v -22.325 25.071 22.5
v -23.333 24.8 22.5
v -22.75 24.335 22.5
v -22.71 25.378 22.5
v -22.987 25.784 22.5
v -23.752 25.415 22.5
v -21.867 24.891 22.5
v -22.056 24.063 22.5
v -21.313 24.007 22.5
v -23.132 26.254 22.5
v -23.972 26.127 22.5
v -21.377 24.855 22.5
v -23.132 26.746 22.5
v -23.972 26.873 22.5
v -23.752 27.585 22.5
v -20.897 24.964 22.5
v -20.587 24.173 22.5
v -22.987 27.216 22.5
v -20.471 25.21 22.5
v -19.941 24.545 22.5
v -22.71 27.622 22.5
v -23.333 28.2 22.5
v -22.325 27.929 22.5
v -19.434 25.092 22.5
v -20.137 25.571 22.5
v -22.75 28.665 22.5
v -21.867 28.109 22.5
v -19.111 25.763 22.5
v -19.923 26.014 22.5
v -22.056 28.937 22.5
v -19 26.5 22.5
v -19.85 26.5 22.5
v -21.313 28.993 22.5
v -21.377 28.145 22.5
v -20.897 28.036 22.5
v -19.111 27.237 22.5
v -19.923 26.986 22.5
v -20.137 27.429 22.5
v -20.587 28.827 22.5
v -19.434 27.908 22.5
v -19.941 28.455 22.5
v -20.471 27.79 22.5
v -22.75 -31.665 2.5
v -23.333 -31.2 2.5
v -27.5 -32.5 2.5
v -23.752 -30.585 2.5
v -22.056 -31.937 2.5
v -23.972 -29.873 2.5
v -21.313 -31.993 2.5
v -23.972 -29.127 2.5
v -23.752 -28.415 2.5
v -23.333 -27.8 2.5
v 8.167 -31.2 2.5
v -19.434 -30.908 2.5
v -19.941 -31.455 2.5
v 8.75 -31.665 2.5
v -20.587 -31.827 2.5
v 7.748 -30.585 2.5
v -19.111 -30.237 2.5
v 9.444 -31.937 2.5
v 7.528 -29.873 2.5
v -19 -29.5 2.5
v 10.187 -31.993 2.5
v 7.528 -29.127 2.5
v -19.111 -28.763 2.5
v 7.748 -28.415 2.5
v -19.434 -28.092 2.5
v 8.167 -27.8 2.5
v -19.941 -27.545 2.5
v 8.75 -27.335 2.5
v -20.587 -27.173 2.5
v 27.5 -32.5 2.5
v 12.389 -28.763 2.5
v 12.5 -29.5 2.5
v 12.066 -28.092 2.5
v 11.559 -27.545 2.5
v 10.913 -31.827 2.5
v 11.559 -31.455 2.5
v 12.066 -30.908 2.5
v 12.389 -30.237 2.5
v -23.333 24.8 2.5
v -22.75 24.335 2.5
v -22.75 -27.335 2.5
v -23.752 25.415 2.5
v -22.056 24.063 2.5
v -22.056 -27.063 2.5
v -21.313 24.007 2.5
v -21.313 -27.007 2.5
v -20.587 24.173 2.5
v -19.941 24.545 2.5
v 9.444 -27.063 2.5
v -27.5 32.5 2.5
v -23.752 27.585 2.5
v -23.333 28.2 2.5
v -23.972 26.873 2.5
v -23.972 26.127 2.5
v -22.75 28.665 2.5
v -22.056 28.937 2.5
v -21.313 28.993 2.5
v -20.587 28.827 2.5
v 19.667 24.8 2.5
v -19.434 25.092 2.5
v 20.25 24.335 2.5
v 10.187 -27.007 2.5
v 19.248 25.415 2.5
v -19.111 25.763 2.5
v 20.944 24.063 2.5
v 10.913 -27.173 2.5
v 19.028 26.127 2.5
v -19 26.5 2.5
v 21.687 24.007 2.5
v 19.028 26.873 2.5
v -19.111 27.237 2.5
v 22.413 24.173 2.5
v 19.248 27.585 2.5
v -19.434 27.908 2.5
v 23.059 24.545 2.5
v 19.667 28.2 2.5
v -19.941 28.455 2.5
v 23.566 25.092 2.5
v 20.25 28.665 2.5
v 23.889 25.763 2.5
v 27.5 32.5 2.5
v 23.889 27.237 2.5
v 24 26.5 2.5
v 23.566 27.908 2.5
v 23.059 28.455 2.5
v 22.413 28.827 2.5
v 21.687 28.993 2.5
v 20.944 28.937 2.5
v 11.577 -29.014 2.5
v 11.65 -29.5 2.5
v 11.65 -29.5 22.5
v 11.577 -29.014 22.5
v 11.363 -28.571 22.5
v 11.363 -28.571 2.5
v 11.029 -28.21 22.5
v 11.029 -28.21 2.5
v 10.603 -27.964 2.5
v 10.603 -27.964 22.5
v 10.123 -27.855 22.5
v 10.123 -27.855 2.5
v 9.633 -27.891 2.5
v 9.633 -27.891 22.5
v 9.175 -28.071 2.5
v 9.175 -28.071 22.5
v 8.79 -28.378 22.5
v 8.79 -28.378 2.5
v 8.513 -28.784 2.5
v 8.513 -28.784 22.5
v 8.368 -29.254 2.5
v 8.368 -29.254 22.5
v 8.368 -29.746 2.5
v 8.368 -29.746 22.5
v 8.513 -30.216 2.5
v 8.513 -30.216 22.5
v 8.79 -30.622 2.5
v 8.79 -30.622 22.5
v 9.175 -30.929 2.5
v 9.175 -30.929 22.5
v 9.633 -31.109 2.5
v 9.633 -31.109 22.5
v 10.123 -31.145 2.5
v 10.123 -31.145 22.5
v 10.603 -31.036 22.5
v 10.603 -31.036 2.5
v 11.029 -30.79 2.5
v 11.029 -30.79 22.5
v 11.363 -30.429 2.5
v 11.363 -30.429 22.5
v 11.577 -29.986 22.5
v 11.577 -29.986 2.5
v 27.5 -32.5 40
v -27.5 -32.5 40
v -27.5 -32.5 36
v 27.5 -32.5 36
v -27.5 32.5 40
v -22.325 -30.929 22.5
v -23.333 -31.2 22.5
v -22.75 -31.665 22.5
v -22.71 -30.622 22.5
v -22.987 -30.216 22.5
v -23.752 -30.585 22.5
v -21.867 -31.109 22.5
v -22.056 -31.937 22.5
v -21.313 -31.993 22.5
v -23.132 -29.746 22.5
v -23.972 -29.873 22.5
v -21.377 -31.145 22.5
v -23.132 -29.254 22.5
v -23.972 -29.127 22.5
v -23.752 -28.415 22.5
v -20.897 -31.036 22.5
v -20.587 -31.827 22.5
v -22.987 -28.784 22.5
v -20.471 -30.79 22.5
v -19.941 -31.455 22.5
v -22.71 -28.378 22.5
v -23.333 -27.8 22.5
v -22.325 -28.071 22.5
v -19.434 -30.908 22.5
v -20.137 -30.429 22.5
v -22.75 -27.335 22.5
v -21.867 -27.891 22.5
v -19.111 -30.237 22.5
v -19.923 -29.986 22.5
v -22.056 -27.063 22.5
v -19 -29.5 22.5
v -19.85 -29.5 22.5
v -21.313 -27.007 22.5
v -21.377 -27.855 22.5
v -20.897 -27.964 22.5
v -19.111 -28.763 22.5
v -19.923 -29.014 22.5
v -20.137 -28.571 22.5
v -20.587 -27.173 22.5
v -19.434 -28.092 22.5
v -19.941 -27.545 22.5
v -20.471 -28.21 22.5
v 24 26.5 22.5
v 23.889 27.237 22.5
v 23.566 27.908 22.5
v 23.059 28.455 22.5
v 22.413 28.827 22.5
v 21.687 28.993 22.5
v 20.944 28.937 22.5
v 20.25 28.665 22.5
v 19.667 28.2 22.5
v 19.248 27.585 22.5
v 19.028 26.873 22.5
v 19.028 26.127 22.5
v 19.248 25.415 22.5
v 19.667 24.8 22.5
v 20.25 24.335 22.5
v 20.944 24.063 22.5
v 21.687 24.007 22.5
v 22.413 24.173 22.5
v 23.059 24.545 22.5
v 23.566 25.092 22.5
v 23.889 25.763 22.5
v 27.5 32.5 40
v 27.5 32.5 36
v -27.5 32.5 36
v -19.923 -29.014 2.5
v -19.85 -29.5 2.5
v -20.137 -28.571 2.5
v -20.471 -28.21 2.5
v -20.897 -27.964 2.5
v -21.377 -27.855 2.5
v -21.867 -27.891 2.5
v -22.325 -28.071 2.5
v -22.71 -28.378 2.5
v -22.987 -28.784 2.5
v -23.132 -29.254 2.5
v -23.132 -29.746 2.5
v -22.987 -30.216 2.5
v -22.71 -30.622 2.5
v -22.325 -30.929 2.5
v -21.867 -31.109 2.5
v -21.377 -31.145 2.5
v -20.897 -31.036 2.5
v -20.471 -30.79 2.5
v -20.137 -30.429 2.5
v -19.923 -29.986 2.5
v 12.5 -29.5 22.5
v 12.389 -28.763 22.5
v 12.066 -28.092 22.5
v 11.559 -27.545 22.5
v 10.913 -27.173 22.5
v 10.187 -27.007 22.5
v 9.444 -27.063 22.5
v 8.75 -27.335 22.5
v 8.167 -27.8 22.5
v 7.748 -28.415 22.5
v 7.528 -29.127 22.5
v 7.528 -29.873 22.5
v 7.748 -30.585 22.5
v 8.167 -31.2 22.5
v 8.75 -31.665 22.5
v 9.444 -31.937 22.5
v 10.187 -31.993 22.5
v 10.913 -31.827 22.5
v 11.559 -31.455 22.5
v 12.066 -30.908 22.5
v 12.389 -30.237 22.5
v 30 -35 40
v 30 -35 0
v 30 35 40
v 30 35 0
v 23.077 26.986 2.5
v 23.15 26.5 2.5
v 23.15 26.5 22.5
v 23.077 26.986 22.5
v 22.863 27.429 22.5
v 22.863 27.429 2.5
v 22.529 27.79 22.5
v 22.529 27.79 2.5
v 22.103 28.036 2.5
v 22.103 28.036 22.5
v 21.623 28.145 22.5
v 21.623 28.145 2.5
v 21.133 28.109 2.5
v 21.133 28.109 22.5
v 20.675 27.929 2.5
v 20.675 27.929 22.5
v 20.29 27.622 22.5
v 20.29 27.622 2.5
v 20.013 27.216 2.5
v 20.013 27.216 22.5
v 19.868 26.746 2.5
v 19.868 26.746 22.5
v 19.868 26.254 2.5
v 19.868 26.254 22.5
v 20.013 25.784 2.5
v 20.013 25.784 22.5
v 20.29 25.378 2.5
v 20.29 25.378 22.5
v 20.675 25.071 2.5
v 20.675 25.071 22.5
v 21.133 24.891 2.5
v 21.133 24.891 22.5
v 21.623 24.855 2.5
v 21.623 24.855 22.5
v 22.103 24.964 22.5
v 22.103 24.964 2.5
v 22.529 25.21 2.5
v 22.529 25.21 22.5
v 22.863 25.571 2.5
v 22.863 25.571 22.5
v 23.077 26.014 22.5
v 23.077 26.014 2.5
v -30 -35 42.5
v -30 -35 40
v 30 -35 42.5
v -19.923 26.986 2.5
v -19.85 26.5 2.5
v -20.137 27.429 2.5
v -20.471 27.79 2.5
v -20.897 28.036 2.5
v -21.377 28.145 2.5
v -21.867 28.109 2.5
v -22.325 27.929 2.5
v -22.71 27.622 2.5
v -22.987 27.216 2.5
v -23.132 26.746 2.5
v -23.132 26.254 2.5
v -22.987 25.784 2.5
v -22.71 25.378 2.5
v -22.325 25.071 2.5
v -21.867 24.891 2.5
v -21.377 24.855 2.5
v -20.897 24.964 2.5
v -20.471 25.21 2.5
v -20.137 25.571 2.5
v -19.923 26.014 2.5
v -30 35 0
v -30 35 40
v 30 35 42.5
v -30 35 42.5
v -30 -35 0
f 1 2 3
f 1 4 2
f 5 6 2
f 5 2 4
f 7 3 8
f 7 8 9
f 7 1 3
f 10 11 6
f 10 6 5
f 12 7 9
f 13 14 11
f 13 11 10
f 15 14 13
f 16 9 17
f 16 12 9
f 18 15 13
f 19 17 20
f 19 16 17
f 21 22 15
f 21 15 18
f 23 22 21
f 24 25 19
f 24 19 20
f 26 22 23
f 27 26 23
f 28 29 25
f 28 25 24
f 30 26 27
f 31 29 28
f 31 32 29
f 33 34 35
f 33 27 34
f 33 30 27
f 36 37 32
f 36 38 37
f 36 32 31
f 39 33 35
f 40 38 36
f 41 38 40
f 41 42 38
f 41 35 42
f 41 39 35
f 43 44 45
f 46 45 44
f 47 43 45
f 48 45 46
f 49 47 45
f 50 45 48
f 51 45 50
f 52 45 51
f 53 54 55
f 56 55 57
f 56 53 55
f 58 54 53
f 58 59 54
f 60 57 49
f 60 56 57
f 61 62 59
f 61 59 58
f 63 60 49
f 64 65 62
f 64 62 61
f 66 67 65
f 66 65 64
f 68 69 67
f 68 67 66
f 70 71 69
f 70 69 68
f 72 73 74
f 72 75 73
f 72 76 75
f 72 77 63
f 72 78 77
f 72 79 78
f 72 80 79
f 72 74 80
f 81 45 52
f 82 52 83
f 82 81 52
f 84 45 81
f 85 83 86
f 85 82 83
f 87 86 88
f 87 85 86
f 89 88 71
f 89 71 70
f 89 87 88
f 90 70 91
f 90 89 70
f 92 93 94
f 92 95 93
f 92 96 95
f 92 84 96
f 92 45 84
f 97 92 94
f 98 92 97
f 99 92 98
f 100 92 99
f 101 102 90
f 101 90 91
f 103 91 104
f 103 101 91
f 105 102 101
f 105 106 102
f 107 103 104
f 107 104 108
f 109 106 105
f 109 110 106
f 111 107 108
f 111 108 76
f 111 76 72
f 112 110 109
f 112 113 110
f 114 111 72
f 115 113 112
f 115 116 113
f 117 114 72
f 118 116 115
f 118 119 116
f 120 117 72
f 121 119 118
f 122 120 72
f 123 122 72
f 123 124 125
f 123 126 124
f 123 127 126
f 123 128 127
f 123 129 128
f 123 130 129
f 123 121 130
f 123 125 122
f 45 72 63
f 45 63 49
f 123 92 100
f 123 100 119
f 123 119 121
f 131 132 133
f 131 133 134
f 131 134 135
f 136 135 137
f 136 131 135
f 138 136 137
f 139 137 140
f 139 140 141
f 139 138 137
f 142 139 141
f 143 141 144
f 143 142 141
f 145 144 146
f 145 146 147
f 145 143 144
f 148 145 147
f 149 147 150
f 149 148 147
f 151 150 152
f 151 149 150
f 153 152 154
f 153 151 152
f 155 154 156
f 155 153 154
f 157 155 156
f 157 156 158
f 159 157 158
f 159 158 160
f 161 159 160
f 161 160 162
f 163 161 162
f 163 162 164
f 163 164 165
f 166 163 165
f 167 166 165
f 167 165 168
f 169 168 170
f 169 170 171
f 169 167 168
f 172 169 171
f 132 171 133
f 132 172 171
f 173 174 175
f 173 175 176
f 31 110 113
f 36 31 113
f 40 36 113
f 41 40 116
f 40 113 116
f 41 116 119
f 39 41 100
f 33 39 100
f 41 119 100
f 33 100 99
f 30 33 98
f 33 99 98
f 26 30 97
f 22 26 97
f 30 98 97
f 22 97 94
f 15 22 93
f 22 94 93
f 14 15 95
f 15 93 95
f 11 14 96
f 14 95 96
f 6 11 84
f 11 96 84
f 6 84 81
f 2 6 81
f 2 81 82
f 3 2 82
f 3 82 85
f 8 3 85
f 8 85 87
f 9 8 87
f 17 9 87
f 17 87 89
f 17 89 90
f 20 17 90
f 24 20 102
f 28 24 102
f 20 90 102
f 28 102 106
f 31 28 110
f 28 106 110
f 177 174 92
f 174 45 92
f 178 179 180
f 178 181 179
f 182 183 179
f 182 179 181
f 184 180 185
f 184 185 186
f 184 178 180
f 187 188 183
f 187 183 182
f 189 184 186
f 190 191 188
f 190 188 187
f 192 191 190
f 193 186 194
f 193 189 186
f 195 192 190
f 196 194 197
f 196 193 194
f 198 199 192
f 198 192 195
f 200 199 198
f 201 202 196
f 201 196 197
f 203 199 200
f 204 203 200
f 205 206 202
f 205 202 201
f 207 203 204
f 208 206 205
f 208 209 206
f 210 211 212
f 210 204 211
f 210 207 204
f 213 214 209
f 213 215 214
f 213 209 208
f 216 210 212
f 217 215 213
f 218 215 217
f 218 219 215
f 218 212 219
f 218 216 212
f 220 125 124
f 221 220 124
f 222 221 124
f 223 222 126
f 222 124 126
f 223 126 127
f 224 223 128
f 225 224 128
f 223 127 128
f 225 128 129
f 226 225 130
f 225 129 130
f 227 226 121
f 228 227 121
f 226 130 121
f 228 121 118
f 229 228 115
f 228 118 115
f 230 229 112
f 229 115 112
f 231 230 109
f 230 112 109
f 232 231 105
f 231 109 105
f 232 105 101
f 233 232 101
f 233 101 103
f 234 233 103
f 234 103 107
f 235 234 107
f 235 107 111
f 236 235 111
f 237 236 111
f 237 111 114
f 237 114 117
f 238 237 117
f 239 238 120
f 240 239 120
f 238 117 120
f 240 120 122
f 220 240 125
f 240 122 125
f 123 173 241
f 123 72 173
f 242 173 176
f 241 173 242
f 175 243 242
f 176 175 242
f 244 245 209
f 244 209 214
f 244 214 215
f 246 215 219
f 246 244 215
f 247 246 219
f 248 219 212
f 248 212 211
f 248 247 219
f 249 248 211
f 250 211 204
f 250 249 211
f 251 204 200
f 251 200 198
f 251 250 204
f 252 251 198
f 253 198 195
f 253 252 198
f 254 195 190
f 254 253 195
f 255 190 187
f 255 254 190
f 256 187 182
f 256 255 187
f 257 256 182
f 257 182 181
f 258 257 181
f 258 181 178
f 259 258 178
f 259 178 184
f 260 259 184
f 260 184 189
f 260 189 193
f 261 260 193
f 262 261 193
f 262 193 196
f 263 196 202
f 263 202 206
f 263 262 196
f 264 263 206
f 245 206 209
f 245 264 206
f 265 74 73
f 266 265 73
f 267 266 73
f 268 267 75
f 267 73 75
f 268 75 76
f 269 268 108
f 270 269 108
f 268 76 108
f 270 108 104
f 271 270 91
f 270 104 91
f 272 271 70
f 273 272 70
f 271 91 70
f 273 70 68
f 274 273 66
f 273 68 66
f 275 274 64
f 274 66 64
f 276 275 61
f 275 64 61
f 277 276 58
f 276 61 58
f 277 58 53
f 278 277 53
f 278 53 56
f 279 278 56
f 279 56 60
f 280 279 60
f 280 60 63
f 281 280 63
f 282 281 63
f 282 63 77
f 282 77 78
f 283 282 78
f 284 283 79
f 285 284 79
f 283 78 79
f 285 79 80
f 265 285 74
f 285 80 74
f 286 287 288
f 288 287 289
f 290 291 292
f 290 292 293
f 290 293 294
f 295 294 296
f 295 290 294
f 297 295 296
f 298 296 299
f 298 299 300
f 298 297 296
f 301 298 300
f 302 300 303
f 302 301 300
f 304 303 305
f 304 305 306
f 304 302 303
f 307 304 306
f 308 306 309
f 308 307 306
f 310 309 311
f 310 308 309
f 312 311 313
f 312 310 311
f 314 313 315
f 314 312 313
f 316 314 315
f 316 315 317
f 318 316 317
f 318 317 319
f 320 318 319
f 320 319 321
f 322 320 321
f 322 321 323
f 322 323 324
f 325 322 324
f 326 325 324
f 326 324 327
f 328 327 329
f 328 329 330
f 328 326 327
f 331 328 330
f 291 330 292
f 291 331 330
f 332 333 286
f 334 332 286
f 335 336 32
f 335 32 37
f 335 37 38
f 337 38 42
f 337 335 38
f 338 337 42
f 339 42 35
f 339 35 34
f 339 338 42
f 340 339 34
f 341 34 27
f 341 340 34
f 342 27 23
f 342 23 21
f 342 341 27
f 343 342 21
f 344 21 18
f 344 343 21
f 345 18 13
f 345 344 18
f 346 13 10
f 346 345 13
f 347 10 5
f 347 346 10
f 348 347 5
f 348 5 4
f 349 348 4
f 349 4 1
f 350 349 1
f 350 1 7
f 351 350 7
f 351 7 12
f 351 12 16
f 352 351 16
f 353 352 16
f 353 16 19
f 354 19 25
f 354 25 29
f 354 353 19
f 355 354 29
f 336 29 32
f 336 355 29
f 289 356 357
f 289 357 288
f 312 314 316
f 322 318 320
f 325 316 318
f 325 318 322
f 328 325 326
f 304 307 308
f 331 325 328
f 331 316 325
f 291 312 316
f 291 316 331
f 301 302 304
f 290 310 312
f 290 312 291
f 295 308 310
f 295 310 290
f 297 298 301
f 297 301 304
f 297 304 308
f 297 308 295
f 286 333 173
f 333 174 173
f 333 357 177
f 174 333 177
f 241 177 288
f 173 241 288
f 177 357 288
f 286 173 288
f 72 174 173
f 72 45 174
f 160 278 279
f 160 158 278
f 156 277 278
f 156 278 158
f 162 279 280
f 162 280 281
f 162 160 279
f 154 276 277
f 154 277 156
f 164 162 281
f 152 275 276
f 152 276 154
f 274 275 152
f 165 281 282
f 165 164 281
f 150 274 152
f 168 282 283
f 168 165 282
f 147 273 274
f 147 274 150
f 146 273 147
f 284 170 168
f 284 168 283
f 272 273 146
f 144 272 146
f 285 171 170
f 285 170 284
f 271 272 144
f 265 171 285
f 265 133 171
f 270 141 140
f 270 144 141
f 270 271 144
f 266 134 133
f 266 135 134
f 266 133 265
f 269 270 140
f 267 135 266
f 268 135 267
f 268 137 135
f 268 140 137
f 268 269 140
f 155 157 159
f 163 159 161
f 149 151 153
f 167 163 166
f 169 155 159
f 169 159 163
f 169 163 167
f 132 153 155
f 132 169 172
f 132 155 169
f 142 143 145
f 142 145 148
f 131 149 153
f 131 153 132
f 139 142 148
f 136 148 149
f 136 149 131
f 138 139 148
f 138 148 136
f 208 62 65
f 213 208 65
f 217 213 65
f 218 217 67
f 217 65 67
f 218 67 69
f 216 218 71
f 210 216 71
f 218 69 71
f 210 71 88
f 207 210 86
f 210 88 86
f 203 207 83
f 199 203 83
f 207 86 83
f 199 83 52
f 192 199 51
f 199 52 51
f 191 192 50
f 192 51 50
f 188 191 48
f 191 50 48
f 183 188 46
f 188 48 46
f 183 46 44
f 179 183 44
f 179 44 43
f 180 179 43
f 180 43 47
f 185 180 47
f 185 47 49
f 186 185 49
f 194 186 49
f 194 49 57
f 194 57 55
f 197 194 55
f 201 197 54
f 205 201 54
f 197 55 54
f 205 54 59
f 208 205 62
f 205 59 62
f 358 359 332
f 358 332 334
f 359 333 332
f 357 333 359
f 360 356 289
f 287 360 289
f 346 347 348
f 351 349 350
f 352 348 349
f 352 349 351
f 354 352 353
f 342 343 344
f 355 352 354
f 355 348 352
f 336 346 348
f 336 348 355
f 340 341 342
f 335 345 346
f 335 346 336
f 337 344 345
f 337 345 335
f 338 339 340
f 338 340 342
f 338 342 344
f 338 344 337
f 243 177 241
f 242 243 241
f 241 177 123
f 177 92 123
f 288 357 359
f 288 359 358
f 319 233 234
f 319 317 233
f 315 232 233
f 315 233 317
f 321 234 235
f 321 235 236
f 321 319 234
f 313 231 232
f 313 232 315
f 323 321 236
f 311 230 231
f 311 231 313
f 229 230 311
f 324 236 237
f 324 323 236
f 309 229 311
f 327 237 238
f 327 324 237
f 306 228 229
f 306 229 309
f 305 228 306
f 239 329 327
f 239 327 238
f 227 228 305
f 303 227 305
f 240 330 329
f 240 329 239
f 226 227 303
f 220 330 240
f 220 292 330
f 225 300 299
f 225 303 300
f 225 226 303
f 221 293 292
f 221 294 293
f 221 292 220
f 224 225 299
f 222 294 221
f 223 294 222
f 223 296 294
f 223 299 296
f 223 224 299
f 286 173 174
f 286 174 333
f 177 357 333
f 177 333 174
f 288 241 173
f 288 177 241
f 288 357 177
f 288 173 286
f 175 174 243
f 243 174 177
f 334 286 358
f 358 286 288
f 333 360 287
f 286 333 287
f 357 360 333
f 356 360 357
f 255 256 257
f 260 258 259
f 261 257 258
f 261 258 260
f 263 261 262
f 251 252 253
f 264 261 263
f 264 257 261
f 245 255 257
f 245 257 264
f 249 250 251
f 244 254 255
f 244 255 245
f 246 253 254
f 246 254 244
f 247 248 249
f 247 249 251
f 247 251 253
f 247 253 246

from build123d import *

# Parameters (mm, degrees)
F0_W     = 60
F0_H     = 70
F1_DEPTH = 40
F2_T     = -2.5
F3_W     = 60
F3_H     = 70
F3_W_2   = 55
F3_H_2   = 65
F4_DEPTH = 2.5
F5_DEPTH = 4
F6_R     = 2.5
F6_R_2   = 1.65
F7_DEPTH = 20


with BuildPart() as f1:
    # F0 (on Top) → F1 (new body)
    with BuildSketch(Plane.XY):
        Rectangle(F0_W, F0_H)
    extrude(amount=F1_DEPTH)

    # F2
    f2_openings = [f1.faces().sort_by_distance(p)[0] for p in [
        (0, 0, 40),
    ]]
    offset(amount=F2_T, openings=f2_openings)

    # F6 (on face) → F7 (join)
    with BuildSketch(Plane.XY.offset(2.5)):
        with Locations((-21.5, 26.5)):
            Circle(F6_R)
        with Locations((-21.5, 26.5)):
            Circle(F6_R_2, mode=Mode.SUBTRACT)
        with Locations((21.5, 26.5)):
            Circle(F6_R)
        with Locations((21.5, 26.5)):
            Circle(F6_R_2, mode=Mode.SUBTRACT)
        with Locations((-21.5, -29.5)):
            Circle(F6_R)
        with Locations((-21.5, -29.5)):
            Circle(F6_R_2, mode=Mode.SUBTRACT)
        with Locations((10, -29.5)):
            Circle(F6_R)
        with Locations((10, -29.5)):
            Circle(F6_R_2, mode=Mode.SUBTRACT)
    extrude(amount=F7_DEPTH)


with BuildPart() as f4:
    # F3 (on face) → F4 (new body)
    with BuildSketch(Plane.XY.offset(40)):
        Rectangle(F3_W, F3_H)
        Rectangle(F3_W_2, F3_H_2, mode=Mode.SUBTRACT)
        Rectangle(F3_W_2, F3_H_2)
    extrude(amount=F4_DEPTH)

    # F3 (on face) → F5 (join)
    with BuildSketch(Plane.XY.offset(40)):
        Rectangle(F3_W_2, F3_H_2)
    extrude(amount=-F5_DEPTH)


solid = Compound([f1.part, f4.part])
